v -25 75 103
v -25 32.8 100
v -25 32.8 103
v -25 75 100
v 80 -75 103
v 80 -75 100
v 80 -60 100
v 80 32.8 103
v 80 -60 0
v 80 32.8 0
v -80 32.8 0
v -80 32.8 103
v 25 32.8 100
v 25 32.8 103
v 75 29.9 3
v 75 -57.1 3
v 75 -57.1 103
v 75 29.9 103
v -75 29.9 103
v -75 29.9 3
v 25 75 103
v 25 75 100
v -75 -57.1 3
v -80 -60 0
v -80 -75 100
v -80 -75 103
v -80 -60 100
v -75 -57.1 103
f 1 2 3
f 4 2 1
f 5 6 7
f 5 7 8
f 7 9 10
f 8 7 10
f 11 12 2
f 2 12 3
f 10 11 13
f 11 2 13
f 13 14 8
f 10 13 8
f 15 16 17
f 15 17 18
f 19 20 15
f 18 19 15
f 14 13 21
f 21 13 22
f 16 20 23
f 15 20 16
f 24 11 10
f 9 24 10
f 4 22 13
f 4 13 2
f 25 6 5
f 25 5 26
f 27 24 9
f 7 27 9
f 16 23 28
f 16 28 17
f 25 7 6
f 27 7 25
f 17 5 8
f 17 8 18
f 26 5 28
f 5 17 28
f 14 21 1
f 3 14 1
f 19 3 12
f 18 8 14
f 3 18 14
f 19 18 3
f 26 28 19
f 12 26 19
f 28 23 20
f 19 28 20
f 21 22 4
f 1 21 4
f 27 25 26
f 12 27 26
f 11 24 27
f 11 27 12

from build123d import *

# Parameters (mm, degrees)
SKETCH_1_W          = 160
SKETCH_1_H          = 150
EXTRUDE_1_DEPTH     = 3
SKETCH_2_W          = 160
SKETCH_2_H          = 92.8
SKETCH_2_W_2        = 150
SKETCH_2_H_2        = 87
EXTRUDE_2_DEPTH     = 100
SKETCH_4_W          = 55
SKETCH_4_H          = 42.2
CUT_EXTRUDE_2_DEPTH = 3
SKETCH_5_W          = 160
SKETCH_5_H          = 15
SKETCH_5_W_2        = 50
SKETCH_5_H_2        = 42.2
EXTRUDE_3_DEPTH     = 3
SKETCH_5_2_W        = 160
SKETCH_5_2_H        = 15
SKETCH_5_2_W_2      = 50
SKETCH_5_2_H_2      = 42.2
CUT_EXTRUDE_3_DEPTH = 149.408220797


with BuildPart() as part:
    # ｽｹｯﾁ1 → ﾎﾞｽ - 押し出し1 (new body)
    with BuildSketch(Plane.XY):
        Rectangle(SKETCH_1_W, SKETCH_1_H)
    extrude(amount=EXTRUDE_1_DEPTH)

    # ｽｹｯﾁ2 → ﾎﾞｽ - 押し出し2 (add)
    with BuildSketch(Plane.XY.offset(3)):
        with Locations((0, -13.6)):
            Rectangle(SKETCH_2_W, SKETCH_2_H)
        with Locations((0, -13.6)):
            Rectangle(SKETCH_2_W_2, SKETCH_2_H_2, mode=Mode.SUBTRACT)
    extrude(amount=EXTRUDE_2_DEPTH)

    # ｽｹｯﾁ4 → ｶｯﾄ - 押し出し2 (cut)
    with BuildSketch(Plane.XY.offset(3)):
        with Locations((-52.5, 53.9)):
            Rectangle(SKETCH_4_W, SKETCH_4_H)
        with Locations((52.5, 53.9)):
            Rectangle(SKETCH_4_W, SKETCH_4_H)
    extrude(amount=-CUT_EXTRUDE_2_DEPTH, mode=Mode.SUBTRACT)

    # ｽｹｯﾁ5 → ﾎﾞｽ - 押し出し3 (add)
    with BuildSketch(Plane(origin=(0, 0, 100), x_dir=(-1, 0, 0), z_dir=(0, 0, -1))):
        with Locations((0, -67.5)):
            Rectangle(SKETCH_5_W, SKETCH_5_H)
        with Locations((0, 53.9)):
            Rectangle(SKETCH_5_W_2, SKETCH_5_H_2)
    extrude(amount=-EXTRUDE_3_DEPTH)

    # ｽｹｯﾁ5<2> → ｶｯﾄ - 押し出し3 (cut, through all)
    with BuildSketch(Plane(origin=(0, 0, 100), x_dir=(-1, 0, 0), z_dir=(0, 0, -1))):
        with Locations((0, -67.5)):
            Rectangle(SKETCH_5_2_W, SKETCH_5_2_H)
        with Locations((0, 53.9)):
            Rectangle(SKETCH_5_2_W_2, SKETCH_5_2_H_2)
    extrude(amount=CUT_EXTRUDE_3_DEPTH, mode=Mode.SUBTRACT)


solid = part.part
